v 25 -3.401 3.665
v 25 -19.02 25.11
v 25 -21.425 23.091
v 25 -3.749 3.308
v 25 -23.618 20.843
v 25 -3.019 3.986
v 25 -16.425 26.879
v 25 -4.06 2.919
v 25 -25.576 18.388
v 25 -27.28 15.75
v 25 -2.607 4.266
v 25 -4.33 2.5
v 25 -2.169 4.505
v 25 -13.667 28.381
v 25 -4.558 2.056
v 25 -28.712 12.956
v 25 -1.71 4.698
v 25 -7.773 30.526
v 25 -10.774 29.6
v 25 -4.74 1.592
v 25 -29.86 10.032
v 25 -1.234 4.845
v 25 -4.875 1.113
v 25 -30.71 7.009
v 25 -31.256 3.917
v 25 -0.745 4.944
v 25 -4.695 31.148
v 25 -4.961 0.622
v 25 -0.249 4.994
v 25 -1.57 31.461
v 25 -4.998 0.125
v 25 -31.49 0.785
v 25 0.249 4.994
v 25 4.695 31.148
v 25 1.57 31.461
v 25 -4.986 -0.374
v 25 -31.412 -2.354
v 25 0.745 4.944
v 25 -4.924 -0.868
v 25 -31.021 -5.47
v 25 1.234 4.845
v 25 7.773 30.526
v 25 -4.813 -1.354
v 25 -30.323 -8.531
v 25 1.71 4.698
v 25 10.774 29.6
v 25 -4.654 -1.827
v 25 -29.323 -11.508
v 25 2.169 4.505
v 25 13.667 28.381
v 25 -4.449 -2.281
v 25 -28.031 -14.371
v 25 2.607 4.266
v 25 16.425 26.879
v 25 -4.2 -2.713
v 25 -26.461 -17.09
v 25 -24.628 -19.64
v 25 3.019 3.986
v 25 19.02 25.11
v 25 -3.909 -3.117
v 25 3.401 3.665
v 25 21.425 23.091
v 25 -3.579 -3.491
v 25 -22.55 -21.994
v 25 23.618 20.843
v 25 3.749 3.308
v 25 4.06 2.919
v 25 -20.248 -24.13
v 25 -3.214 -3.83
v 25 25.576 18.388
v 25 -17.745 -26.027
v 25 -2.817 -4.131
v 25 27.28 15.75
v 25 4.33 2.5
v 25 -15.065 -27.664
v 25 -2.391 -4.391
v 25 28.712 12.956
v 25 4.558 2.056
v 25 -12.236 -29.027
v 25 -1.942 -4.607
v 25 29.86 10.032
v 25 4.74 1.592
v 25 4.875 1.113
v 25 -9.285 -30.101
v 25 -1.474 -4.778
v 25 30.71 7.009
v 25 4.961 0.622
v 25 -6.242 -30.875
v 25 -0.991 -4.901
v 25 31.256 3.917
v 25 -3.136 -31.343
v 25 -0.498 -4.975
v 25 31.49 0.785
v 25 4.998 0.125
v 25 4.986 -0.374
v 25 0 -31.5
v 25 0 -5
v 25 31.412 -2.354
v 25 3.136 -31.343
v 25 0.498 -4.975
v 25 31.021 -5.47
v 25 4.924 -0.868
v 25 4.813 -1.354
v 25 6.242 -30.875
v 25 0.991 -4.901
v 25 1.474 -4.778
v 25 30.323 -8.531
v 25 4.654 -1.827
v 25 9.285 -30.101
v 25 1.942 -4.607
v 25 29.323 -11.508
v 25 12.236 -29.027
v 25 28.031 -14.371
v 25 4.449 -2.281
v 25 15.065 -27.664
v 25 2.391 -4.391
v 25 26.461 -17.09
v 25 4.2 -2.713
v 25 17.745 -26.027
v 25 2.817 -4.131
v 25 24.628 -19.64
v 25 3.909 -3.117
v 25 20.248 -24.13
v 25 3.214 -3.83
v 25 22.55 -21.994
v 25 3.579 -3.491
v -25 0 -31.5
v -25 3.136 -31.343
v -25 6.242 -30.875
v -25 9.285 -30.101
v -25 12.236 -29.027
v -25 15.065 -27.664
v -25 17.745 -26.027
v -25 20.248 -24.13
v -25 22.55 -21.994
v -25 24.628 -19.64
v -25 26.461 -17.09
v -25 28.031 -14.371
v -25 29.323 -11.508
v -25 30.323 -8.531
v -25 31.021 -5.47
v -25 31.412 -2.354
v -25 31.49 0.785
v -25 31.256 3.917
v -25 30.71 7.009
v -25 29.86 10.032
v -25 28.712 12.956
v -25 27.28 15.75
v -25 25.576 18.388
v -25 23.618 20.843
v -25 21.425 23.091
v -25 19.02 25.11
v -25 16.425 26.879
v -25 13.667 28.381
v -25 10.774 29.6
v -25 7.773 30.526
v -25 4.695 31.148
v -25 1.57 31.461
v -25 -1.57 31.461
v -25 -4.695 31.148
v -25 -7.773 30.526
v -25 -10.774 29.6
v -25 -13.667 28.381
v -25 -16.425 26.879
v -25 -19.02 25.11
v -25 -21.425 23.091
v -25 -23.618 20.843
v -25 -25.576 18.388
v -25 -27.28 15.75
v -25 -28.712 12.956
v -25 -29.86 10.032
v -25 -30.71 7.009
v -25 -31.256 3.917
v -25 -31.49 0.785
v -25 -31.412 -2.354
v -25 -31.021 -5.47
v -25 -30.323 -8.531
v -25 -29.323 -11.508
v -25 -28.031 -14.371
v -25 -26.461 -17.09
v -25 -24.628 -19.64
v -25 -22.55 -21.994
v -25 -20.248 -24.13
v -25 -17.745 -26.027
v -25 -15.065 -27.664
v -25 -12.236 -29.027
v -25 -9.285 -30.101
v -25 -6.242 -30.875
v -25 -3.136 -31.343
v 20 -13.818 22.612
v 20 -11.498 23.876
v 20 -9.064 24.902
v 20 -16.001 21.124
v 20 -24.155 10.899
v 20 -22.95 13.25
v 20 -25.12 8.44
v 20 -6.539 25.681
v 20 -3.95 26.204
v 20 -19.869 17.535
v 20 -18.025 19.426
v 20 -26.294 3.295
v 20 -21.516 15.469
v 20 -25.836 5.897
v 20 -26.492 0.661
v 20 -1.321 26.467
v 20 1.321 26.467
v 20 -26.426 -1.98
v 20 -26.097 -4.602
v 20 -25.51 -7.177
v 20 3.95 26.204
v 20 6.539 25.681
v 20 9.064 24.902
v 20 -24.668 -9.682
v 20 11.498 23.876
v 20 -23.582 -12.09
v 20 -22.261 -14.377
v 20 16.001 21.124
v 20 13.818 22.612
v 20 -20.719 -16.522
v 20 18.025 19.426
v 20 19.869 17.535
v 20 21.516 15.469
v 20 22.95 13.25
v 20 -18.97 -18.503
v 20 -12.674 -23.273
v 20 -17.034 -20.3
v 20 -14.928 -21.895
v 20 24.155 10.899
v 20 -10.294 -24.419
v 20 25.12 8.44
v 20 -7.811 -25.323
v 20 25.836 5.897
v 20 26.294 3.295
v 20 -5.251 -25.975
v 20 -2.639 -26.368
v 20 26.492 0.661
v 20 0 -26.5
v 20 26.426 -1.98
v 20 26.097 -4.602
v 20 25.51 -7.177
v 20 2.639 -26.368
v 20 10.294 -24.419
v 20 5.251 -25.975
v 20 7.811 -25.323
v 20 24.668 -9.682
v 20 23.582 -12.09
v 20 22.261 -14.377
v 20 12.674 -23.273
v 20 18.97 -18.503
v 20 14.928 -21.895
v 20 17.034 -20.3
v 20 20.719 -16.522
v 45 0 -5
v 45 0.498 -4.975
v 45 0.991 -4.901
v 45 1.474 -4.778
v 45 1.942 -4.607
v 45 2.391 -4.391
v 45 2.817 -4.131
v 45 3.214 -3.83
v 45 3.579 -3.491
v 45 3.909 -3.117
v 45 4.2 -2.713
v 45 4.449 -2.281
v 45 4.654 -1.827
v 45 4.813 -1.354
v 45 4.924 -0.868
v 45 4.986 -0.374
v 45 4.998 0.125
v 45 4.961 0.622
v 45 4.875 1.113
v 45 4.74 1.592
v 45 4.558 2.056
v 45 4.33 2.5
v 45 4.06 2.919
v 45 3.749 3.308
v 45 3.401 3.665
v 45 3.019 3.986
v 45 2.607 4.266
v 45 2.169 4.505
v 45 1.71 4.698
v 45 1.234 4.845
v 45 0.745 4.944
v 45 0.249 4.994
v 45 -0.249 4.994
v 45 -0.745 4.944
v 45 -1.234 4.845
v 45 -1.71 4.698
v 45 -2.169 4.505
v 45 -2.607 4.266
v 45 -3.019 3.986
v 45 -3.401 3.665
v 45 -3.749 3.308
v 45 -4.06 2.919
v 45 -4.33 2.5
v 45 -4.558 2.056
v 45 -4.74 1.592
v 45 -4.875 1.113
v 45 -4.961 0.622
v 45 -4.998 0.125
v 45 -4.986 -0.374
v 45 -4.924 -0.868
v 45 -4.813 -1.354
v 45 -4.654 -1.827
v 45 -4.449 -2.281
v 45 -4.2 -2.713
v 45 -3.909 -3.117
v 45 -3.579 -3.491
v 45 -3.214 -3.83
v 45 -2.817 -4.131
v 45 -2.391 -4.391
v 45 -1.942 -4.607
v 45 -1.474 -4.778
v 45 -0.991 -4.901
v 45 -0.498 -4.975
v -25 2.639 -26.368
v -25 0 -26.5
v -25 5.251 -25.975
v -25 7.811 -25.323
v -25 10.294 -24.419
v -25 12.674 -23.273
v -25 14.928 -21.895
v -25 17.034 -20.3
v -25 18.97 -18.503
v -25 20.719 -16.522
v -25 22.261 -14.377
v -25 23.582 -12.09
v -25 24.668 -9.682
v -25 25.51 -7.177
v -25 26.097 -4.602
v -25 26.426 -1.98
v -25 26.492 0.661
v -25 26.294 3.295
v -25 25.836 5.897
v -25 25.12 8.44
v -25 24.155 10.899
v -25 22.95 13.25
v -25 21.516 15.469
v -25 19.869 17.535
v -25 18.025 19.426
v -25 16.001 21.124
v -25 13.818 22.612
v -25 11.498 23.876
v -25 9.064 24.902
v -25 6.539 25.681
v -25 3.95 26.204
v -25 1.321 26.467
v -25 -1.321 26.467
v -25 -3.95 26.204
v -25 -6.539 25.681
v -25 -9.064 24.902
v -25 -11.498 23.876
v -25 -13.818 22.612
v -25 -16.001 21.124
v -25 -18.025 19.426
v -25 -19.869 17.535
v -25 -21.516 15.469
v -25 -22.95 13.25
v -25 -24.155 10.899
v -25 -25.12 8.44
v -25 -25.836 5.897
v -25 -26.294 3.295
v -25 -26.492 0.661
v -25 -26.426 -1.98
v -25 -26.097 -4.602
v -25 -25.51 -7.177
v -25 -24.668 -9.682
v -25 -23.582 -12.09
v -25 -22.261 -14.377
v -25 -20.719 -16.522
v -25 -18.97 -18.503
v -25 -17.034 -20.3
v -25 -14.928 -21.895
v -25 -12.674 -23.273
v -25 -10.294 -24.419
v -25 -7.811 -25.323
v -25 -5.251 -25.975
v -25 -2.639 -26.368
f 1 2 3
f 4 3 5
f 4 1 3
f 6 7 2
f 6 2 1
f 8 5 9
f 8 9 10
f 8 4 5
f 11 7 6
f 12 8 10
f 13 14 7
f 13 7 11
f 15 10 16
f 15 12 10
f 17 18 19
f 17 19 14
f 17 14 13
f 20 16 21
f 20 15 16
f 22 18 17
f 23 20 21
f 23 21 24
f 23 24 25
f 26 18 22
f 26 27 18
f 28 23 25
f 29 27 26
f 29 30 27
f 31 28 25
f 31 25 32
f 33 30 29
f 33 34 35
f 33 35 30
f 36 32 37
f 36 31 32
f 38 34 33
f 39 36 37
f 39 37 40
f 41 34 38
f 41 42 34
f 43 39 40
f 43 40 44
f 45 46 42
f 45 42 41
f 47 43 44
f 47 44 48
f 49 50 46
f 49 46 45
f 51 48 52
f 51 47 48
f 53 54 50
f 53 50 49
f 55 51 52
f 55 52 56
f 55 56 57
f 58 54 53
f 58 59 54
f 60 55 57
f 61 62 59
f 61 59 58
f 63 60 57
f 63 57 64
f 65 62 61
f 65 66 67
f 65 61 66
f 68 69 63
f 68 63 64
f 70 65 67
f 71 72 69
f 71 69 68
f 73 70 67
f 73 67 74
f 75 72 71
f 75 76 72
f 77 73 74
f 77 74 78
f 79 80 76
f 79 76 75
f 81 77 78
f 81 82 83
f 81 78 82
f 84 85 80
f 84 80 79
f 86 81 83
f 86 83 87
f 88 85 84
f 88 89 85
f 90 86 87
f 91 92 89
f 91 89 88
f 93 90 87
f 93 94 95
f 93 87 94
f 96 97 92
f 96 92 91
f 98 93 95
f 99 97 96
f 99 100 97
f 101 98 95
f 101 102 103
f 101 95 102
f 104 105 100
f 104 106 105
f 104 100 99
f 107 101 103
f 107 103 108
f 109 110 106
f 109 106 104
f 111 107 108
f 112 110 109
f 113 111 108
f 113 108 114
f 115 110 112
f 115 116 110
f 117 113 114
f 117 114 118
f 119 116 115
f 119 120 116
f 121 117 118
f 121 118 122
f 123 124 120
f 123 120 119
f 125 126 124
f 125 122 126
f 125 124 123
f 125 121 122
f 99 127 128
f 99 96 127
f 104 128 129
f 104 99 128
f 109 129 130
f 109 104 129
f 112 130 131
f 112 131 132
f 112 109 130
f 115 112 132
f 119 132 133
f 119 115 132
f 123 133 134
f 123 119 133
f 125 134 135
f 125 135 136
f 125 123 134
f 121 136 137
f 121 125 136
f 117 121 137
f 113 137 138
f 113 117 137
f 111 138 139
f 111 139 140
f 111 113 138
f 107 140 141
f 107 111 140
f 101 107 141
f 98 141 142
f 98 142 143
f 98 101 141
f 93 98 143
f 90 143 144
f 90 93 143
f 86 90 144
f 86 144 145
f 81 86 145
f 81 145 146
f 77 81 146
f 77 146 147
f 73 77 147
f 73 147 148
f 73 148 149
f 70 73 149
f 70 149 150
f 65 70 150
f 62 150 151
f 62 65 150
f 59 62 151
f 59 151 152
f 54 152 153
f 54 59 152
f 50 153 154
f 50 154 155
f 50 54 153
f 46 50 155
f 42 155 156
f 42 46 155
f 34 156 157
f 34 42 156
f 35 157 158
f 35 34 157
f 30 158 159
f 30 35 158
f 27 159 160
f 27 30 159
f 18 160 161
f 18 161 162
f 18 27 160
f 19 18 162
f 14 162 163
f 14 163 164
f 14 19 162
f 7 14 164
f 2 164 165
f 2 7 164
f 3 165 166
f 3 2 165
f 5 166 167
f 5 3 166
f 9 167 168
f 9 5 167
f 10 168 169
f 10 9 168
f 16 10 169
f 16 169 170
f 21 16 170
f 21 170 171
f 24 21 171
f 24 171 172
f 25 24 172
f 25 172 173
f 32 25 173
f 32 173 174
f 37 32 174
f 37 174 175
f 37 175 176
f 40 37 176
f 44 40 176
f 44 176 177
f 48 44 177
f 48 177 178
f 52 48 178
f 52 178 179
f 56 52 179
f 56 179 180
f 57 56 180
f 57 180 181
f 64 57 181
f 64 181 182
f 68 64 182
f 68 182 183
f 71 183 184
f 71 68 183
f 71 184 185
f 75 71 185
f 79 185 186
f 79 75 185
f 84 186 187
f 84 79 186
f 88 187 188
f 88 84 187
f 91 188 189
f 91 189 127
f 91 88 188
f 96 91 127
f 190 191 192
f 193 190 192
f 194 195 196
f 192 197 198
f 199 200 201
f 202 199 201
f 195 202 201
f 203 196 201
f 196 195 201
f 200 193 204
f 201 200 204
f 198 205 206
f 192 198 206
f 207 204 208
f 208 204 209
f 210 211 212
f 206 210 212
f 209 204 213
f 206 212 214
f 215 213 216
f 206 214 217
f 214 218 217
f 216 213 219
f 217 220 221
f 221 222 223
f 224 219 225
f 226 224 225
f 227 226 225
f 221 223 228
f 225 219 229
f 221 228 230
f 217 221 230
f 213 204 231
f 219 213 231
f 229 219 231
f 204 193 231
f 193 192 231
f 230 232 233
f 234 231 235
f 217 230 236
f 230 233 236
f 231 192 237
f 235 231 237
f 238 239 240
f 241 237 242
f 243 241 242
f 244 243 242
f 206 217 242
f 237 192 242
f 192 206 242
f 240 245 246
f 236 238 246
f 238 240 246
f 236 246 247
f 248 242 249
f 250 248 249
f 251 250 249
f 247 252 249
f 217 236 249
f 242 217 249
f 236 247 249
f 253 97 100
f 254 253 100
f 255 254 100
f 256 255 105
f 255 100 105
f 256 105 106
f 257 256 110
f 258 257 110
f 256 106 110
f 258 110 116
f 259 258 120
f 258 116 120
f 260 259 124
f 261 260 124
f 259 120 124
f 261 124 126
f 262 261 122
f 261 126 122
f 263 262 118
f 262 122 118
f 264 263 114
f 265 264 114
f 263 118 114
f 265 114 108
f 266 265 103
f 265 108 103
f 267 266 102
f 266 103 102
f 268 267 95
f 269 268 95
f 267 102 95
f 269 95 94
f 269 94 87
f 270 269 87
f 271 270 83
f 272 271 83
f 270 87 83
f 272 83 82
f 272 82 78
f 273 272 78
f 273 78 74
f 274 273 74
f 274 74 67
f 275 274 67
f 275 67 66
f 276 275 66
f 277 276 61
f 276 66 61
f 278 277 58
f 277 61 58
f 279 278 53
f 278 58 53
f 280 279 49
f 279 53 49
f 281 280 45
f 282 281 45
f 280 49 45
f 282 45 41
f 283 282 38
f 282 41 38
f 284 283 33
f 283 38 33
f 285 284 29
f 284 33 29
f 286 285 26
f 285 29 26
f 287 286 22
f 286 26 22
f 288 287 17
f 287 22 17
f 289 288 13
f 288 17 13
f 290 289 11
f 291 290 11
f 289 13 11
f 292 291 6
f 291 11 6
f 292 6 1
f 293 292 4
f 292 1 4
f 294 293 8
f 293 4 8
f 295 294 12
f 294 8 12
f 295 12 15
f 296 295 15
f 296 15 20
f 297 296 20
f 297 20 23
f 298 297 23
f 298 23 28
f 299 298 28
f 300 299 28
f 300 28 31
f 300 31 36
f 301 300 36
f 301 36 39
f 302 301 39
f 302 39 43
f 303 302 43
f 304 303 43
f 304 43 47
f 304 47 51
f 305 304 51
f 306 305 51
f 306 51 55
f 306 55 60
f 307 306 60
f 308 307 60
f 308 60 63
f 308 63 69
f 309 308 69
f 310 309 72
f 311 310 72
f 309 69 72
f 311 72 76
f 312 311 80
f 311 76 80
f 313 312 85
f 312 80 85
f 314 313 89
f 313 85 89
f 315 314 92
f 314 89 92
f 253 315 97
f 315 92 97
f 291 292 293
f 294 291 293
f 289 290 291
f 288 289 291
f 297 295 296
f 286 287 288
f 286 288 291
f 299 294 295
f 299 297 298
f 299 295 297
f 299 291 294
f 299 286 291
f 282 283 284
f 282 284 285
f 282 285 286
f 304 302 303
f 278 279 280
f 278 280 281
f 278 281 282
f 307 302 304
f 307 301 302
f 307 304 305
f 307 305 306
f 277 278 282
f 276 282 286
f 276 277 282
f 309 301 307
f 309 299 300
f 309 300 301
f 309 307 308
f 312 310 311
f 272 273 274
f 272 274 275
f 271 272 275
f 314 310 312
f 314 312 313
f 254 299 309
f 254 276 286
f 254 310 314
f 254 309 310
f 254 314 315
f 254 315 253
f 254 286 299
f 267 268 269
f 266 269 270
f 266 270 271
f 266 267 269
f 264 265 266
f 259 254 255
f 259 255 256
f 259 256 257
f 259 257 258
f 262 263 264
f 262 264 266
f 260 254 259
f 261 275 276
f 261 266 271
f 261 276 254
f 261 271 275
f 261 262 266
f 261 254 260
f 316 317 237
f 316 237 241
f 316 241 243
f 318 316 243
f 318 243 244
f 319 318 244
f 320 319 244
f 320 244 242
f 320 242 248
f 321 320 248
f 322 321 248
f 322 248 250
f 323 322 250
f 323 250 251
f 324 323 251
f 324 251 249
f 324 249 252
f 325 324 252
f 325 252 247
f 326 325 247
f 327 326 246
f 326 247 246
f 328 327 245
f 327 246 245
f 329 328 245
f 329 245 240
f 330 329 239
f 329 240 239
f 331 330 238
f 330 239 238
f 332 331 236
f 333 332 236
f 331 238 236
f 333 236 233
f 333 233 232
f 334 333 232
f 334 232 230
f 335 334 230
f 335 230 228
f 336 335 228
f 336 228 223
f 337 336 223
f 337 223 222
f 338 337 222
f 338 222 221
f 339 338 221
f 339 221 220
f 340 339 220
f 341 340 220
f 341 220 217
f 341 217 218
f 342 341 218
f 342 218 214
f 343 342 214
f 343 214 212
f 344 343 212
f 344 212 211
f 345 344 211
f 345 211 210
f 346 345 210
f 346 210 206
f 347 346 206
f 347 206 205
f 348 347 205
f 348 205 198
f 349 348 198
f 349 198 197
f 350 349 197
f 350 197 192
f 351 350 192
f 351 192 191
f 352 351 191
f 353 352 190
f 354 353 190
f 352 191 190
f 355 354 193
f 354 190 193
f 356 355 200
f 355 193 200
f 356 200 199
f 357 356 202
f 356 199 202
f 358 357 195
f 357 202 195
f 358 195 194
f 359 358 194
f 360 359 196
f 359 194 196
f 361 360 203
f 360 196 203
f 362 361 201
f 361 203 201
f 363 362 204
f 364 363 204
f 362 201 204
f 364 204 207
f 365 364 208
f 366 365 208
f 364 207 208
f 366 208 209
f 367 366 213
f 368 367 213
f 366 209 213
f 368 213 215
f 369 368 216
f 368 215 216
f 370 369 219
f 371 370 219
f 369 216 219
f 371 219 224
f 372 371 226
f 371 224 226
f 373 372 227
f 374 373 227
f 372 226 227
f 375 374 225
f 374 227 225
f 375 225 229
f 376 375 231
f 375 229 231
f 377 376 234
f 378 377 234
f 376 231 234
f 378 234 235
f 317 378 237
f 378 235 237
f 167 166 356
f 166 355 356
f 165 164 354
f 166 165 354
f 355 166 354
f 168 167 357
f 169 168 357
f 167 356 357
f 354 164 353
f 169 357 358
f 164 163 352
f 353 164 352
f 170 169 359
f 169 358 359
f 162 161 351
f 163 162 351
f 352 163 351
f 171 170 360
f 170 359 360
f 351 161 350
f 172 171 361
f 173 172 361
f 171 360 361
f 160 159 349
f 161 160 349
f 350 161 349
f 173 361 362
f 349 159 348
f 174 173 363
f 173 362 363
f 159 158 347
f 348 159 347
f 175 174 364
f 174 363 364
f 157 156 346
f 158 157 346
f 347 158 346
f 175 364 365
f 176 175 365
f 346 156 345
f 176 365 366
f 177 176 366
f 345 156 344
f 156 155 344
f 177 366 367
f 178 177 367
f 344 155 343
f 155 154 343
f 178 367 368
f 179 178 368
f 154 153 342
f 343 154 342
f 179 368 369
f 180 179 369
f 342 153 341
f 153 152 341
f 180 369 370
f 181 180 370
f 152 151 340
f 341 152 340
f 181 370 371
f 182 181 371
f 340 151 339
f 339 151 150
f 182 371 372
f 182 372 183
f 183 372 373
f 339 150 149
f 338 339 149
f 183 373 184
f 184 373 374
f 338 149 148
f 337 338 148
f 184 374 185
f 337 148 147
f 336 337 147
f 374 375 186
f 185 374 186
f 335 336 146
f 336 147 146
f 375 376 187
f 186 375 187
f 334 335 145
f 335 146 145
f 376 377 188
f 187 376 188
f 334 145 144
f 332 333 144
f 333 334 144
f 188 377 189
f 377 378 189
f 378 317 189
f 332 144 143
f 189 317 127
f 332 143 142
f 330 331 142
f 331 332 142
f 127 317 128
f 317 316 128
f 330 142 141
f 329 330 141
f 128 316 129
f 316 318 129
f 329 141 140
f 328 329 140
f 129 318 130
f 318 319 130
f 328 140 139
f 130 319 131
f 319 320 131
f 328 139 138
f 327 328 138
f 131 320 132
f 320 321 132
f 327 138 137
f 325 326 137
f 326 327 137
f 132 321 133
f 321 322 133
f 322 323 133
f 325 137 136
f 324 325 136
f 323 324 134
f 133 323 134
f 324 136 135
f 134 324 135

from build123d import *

# Parameters (mm, degrees)
SKETCH1_R           = 31.5
BOSS_EXTRUDE1_DEPTH = 25
SHELL1_T            = -5
SKETCH2_R           = 5
BOSS_EXTRUDE3_DEPTH = 20


with BuildPart() as part:
    # Sketch1 → Boss-Extrude1 (new, symmetric)
    with BuildSketch(Plane(origin=(0, 0, 0), x_dir=(0, 0, -1), z_dir=(1, 0, 0))):
        Circle(SKETCH1_R)
    extrude(amount=BOSS_EXTRUDE1_DEPTH, both=True)

    # Shell1
    shell1_openings = [part.faces().sort_by_distance(p)[0] for p in [
        (-25, 0, 0),
    ]]
    offset(amount=SHELL1_T, openings=shell1_openings, kind=Kind.INTERSECTION)

    # Sketch2 → Boss-Extrude3 (add)
    with BuildSketch(Plane(origin=(25, 0, 0), x_dir=(0, 0, -1), z_dir=(1, 0, 0))):
        Circle(SKETCH2_R)
    extrude(amount=BOSS_EXTRUDE3_DEPTH)


solid = part.part
